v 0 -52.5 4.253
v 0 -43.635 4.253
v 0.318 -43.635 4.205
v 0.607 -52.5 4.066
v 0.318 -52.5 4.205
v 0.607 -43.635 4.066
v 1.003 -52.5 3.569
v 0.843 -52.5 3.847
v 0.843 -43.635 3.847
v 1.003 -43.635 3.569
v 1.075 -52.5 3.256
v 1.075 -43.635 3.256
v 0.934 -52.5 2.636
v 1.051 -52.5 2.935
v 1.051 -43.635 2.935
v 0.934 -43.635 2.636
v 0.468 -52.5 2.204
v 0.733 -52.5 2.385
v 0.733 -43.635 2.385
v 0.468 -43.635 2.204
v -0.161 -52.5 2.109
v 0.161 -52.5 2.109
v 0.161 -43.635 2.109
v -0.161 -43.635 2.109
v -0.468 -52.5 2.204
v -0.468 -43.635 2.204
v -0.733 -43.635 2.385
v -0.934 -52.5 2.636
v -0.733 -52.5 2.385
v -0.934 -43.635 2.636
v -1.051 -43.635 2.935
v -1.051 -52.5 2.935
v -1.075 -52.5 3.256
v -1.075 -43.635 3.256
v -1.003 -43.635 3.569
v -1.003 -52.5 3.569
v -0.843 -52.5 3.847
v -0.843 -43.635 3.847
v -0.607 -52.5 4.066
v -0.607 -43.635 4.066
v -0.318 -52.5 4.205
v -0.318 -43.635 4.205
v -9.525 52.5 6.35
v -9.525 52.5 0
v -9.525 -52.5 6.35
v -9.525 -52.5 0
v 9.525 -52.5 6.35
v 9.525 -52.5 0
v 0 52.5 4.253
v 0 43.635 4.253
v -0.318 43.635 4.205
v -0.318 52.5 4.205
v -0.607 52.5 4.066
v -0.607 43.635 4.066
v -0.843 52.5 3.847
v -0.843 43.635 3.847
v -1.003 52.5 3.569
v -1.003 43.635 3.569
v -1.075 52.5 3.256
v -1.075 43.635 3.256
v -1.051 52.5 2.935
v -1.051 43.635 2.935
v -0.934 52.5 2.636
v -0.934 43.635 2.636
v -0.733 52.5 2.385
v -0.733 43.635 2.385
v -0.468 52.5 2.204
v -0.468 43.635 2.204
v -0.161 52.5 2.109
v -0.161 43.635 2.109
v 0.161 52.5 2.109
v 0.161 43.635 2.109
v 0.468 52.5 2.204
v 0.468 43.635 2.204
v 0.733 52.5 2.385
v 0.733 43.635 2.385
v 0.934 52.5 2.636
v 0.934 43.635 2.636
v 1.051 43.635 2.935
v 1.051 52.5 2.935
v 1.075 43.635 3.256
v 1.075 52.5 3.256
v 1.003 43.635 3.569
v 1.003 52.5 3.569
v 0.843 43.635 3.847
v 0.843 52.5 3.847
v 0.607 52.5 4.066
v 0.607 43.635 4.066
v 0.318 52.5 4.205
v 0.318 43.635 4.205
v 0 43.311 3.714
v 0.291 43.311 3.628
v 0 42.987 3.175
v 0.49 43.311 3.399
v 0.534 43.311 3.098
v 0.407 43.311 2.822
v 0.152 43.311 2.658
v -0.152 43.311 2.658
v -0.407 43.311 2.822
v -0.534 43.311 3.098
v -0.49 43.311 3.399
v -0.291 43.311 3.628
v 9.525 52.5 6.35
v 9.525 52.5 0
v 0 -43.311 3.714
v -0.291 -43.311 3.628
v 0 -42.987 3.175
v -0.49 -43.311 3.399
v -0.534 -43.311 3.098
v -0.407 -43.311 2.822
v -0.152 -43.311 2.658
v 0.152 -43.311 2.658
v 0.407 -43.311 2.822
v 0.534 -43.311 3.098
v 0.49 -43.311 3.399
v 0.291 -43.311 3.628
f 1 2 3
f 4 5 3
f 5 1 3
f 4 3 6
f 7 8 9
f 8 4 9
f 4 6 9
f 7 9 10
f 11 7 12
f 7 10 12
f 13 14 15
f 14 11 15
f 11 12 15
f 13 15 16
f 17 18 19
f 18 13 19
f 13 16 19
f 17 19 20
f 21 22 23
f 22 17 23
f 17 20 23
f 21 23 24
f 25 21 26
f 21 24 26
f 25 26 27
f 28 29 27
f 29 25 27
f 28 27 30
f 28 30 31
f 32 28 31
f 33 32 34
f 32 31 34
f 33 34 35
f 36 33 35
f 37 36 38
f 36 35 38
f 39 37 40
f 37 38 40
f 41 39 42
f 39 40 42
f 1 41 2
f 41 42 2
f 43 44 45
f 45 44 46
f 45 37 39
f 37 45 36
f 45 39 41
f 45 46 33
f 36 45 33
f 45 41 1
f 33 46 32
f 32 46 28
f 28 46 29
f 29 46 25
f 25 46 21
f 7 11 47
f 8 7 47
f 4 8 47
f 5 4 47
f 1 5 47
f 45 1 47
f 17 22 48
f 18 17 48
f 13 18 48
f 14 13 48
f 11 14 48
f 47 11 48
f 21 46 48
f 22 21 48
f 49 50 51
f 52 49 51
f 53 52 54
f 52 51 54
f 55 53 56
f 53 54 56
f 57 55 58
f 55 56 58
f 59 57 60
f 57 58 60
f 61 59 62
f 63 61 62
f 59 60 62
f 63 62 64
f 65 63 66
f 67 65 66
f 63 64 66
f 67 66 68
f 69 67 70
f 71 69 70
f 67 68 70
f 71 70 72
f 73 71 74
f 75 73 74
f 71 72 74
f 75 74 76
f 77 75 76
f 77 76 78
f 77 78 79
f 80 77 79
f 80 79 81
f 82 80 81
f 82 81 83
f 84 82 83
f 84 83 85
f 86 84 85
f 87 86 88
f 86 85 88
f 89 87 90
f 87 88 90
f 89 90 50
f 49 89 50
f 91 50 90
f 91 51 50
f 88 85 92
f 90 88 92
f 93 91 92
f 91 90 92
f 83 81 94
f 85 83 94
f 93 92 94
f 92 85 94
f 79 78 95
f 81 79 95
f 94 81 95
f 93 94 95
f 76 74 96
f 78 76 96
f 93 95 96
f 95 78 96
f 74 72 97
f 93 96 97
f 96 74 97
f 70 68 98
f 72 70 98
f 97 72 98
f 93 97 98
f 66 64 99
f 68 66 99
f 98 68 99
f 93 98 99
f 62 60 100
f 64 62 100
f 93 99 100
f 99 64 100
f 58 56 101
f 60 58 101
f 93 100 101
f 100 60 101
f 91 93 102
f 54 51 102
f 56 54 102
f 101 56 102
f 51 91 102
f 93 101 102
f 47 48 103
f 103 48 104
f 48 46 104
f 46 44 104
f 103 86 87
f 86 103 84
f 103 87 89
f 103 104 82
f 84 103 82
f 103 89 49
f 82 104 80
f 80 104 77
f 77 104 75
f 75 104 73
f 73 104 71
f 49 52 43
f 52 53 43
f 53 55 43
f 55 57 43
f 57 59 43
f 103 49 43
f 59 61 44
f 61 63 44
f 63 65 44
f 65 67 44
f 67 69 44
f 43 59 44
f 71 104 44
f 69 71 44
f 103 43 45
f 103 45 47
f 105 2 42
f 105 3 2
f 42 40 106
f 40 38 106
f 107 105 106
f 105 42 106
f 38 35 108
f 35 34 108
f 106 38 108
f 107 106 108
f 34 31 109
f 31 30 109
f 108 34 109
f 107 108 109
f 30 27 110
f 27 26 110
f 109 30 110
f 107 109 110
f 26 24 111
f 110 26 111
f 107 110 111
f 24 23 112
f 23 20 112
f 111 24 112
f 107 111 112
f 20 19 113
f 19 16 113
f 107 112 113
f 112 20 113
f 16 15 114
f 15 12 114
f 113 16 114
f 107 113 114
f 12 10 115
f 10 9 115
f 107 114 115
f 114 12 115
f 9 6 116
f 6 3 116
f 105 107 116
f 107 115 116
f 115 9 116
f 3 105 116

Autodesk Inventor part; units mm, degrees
ref_plane "YZ Plane" through (0, 0, 0) normal (1, 0, 0) x (0, 1, 0)
ref_plane "XZ Plane" through (0, 0, 0) normal (0, 1, 0) x (-1, 0, 0)
ref_plane "XY Plane" through (0, 0, 0) normal (0, 0, 1) x (1, 0, 0)
sketch "Sketch1" plane through (0, 0, 0) normal (0, 0, 1) x (1, 0, 0)
  line L0 (-9.525, -52.5) -> (9.525, -52.5)
  line L1 (9.525, -52.5) -> (9.525, 52.5)
  line L2 (9.525, 52.5) -> (-9.525, 52.5)
  line L3 (-9.525, 52.5) -> (-9.525, -52.5)
  line L4 (-9.525, -52.5) -> (9.525, 52.5) construction
  line L5 (9.525, -52.5) -> (-9.525, 52.5) construction
  point P0 (0, 0)
  dimension "d0" = 19.05
  dimension "d1" = 105
extrude "Extrusion1" add sketch "Sketch1" along normal blind 6.35
sketch "Sketch3" plane through (-9.525, 52.5, 0) normal (0, 1, 0) x (1, 0, 0)
  line L0 (19.05, 0) -> (0, 0) projected
  line L1 (0, 0) -> (0, -6.35) projected
  line L2 (19.05, -6.35) -> (0, -6.35) projected
  line L3 (19.05, 0) -> (19.05, -6.35) projected
  line L4 (0, 0) -> (0, -6.35) projected
  line L5 (0, 0) -> (19.05, -6.35)
  point P0 (9.525, 0)
  point P1 (9.525, -3.175)
hole "Hole1" at (0, 52.5, 3.175) direction (0, -1, 0) diameter 2.156 depth 8.865 tip angle 118 thread size "4-40 UNC" class "2B" standard "ANSI Unified Screw Threads"
mirror "Mirror1" about plane through (0, 0, 0) normal (0, 1, 0) of "Hole1"
equation "\"d0\" = sensorHolderDepth"
equation "\"d2\" = acrylicThickness"
equation "\"acrylicThickness\" = 6.35"
equation "\"height\" = 127"
equation "\"width\" = 127"
equation "\"depth\" = 127"
equation "\"mirrorAngle\" = 5deg"
equation "\"detectorWidth\" = 52"
equation "\"detectorHeight\" = 52"
equation "\"mirrorThickness\" = 3.175"
equation "\"fresnelThickness\" = 0.1"
equation "\"focalLength\" = 76.2"
equation "\"ior\" = 1.49"
equation "\"centerThickness\" = 1.524"
equation "\"fresnelAngle\" = 90deg"
equation "\"fresnelEffectiveDiameter\" = 152.4"
equation "\"mirrorSuppourtWidth\" = 38.1"
equation "\"backGrooveBit\" = 4.8006"
equation "\"detectorOpeningWidth\" = 76.2"
equation "\"detectorOpeningHeight\" = 76.2"
equation "\"sensorHolderSensorHeight\" = 53.975"
equation "\"sensorHolderSensorWidth\" = 53.975"
equation "\"oRingWidth\" = 1.5875"
equation "\"sensorHolderORingID\" = 203.2"
equation "\"sensorHolderFlushORingID\" = 304.8"
equation "\"frontBackORingID\" = 419.1"
equation "\"mirrorGroove\" = 19.05"
equation "\"backMirrorGroove\" = 6.35"
equation "\"fresnelMirrorChamfer\" = 6.35"
equation "\"mirrorGrooveMill\" = 3.175"
equation "\"sensorHolderDepth\" = 19.05"
equation "\"frameAcrylicThickness\" = 9.525"
equation "\"internalAcrylicThicnkess\" = 6.35"
equation "\"internalAcrylicThickness\" = 6.35"
equation "\"aerogelClearence\" = 3.175"
equation "\"backplanePCBWidth\" = 76.2"
equation "\"backplanePostionOffsett\" = 12.7"
equation "\"backplaneHoleOffsett\" = 6.35"
equation "\"backplanePCBHeight\" = 76.2"
equation "\"moduleSlotClearence\" = 0.79375"
equation "\"plasticThickness\" = 6.35"
equation "\"aerogelHolderDepth\" = 37.30625"
properties part number "detectorSuppourt" material "ABS Plastic"
